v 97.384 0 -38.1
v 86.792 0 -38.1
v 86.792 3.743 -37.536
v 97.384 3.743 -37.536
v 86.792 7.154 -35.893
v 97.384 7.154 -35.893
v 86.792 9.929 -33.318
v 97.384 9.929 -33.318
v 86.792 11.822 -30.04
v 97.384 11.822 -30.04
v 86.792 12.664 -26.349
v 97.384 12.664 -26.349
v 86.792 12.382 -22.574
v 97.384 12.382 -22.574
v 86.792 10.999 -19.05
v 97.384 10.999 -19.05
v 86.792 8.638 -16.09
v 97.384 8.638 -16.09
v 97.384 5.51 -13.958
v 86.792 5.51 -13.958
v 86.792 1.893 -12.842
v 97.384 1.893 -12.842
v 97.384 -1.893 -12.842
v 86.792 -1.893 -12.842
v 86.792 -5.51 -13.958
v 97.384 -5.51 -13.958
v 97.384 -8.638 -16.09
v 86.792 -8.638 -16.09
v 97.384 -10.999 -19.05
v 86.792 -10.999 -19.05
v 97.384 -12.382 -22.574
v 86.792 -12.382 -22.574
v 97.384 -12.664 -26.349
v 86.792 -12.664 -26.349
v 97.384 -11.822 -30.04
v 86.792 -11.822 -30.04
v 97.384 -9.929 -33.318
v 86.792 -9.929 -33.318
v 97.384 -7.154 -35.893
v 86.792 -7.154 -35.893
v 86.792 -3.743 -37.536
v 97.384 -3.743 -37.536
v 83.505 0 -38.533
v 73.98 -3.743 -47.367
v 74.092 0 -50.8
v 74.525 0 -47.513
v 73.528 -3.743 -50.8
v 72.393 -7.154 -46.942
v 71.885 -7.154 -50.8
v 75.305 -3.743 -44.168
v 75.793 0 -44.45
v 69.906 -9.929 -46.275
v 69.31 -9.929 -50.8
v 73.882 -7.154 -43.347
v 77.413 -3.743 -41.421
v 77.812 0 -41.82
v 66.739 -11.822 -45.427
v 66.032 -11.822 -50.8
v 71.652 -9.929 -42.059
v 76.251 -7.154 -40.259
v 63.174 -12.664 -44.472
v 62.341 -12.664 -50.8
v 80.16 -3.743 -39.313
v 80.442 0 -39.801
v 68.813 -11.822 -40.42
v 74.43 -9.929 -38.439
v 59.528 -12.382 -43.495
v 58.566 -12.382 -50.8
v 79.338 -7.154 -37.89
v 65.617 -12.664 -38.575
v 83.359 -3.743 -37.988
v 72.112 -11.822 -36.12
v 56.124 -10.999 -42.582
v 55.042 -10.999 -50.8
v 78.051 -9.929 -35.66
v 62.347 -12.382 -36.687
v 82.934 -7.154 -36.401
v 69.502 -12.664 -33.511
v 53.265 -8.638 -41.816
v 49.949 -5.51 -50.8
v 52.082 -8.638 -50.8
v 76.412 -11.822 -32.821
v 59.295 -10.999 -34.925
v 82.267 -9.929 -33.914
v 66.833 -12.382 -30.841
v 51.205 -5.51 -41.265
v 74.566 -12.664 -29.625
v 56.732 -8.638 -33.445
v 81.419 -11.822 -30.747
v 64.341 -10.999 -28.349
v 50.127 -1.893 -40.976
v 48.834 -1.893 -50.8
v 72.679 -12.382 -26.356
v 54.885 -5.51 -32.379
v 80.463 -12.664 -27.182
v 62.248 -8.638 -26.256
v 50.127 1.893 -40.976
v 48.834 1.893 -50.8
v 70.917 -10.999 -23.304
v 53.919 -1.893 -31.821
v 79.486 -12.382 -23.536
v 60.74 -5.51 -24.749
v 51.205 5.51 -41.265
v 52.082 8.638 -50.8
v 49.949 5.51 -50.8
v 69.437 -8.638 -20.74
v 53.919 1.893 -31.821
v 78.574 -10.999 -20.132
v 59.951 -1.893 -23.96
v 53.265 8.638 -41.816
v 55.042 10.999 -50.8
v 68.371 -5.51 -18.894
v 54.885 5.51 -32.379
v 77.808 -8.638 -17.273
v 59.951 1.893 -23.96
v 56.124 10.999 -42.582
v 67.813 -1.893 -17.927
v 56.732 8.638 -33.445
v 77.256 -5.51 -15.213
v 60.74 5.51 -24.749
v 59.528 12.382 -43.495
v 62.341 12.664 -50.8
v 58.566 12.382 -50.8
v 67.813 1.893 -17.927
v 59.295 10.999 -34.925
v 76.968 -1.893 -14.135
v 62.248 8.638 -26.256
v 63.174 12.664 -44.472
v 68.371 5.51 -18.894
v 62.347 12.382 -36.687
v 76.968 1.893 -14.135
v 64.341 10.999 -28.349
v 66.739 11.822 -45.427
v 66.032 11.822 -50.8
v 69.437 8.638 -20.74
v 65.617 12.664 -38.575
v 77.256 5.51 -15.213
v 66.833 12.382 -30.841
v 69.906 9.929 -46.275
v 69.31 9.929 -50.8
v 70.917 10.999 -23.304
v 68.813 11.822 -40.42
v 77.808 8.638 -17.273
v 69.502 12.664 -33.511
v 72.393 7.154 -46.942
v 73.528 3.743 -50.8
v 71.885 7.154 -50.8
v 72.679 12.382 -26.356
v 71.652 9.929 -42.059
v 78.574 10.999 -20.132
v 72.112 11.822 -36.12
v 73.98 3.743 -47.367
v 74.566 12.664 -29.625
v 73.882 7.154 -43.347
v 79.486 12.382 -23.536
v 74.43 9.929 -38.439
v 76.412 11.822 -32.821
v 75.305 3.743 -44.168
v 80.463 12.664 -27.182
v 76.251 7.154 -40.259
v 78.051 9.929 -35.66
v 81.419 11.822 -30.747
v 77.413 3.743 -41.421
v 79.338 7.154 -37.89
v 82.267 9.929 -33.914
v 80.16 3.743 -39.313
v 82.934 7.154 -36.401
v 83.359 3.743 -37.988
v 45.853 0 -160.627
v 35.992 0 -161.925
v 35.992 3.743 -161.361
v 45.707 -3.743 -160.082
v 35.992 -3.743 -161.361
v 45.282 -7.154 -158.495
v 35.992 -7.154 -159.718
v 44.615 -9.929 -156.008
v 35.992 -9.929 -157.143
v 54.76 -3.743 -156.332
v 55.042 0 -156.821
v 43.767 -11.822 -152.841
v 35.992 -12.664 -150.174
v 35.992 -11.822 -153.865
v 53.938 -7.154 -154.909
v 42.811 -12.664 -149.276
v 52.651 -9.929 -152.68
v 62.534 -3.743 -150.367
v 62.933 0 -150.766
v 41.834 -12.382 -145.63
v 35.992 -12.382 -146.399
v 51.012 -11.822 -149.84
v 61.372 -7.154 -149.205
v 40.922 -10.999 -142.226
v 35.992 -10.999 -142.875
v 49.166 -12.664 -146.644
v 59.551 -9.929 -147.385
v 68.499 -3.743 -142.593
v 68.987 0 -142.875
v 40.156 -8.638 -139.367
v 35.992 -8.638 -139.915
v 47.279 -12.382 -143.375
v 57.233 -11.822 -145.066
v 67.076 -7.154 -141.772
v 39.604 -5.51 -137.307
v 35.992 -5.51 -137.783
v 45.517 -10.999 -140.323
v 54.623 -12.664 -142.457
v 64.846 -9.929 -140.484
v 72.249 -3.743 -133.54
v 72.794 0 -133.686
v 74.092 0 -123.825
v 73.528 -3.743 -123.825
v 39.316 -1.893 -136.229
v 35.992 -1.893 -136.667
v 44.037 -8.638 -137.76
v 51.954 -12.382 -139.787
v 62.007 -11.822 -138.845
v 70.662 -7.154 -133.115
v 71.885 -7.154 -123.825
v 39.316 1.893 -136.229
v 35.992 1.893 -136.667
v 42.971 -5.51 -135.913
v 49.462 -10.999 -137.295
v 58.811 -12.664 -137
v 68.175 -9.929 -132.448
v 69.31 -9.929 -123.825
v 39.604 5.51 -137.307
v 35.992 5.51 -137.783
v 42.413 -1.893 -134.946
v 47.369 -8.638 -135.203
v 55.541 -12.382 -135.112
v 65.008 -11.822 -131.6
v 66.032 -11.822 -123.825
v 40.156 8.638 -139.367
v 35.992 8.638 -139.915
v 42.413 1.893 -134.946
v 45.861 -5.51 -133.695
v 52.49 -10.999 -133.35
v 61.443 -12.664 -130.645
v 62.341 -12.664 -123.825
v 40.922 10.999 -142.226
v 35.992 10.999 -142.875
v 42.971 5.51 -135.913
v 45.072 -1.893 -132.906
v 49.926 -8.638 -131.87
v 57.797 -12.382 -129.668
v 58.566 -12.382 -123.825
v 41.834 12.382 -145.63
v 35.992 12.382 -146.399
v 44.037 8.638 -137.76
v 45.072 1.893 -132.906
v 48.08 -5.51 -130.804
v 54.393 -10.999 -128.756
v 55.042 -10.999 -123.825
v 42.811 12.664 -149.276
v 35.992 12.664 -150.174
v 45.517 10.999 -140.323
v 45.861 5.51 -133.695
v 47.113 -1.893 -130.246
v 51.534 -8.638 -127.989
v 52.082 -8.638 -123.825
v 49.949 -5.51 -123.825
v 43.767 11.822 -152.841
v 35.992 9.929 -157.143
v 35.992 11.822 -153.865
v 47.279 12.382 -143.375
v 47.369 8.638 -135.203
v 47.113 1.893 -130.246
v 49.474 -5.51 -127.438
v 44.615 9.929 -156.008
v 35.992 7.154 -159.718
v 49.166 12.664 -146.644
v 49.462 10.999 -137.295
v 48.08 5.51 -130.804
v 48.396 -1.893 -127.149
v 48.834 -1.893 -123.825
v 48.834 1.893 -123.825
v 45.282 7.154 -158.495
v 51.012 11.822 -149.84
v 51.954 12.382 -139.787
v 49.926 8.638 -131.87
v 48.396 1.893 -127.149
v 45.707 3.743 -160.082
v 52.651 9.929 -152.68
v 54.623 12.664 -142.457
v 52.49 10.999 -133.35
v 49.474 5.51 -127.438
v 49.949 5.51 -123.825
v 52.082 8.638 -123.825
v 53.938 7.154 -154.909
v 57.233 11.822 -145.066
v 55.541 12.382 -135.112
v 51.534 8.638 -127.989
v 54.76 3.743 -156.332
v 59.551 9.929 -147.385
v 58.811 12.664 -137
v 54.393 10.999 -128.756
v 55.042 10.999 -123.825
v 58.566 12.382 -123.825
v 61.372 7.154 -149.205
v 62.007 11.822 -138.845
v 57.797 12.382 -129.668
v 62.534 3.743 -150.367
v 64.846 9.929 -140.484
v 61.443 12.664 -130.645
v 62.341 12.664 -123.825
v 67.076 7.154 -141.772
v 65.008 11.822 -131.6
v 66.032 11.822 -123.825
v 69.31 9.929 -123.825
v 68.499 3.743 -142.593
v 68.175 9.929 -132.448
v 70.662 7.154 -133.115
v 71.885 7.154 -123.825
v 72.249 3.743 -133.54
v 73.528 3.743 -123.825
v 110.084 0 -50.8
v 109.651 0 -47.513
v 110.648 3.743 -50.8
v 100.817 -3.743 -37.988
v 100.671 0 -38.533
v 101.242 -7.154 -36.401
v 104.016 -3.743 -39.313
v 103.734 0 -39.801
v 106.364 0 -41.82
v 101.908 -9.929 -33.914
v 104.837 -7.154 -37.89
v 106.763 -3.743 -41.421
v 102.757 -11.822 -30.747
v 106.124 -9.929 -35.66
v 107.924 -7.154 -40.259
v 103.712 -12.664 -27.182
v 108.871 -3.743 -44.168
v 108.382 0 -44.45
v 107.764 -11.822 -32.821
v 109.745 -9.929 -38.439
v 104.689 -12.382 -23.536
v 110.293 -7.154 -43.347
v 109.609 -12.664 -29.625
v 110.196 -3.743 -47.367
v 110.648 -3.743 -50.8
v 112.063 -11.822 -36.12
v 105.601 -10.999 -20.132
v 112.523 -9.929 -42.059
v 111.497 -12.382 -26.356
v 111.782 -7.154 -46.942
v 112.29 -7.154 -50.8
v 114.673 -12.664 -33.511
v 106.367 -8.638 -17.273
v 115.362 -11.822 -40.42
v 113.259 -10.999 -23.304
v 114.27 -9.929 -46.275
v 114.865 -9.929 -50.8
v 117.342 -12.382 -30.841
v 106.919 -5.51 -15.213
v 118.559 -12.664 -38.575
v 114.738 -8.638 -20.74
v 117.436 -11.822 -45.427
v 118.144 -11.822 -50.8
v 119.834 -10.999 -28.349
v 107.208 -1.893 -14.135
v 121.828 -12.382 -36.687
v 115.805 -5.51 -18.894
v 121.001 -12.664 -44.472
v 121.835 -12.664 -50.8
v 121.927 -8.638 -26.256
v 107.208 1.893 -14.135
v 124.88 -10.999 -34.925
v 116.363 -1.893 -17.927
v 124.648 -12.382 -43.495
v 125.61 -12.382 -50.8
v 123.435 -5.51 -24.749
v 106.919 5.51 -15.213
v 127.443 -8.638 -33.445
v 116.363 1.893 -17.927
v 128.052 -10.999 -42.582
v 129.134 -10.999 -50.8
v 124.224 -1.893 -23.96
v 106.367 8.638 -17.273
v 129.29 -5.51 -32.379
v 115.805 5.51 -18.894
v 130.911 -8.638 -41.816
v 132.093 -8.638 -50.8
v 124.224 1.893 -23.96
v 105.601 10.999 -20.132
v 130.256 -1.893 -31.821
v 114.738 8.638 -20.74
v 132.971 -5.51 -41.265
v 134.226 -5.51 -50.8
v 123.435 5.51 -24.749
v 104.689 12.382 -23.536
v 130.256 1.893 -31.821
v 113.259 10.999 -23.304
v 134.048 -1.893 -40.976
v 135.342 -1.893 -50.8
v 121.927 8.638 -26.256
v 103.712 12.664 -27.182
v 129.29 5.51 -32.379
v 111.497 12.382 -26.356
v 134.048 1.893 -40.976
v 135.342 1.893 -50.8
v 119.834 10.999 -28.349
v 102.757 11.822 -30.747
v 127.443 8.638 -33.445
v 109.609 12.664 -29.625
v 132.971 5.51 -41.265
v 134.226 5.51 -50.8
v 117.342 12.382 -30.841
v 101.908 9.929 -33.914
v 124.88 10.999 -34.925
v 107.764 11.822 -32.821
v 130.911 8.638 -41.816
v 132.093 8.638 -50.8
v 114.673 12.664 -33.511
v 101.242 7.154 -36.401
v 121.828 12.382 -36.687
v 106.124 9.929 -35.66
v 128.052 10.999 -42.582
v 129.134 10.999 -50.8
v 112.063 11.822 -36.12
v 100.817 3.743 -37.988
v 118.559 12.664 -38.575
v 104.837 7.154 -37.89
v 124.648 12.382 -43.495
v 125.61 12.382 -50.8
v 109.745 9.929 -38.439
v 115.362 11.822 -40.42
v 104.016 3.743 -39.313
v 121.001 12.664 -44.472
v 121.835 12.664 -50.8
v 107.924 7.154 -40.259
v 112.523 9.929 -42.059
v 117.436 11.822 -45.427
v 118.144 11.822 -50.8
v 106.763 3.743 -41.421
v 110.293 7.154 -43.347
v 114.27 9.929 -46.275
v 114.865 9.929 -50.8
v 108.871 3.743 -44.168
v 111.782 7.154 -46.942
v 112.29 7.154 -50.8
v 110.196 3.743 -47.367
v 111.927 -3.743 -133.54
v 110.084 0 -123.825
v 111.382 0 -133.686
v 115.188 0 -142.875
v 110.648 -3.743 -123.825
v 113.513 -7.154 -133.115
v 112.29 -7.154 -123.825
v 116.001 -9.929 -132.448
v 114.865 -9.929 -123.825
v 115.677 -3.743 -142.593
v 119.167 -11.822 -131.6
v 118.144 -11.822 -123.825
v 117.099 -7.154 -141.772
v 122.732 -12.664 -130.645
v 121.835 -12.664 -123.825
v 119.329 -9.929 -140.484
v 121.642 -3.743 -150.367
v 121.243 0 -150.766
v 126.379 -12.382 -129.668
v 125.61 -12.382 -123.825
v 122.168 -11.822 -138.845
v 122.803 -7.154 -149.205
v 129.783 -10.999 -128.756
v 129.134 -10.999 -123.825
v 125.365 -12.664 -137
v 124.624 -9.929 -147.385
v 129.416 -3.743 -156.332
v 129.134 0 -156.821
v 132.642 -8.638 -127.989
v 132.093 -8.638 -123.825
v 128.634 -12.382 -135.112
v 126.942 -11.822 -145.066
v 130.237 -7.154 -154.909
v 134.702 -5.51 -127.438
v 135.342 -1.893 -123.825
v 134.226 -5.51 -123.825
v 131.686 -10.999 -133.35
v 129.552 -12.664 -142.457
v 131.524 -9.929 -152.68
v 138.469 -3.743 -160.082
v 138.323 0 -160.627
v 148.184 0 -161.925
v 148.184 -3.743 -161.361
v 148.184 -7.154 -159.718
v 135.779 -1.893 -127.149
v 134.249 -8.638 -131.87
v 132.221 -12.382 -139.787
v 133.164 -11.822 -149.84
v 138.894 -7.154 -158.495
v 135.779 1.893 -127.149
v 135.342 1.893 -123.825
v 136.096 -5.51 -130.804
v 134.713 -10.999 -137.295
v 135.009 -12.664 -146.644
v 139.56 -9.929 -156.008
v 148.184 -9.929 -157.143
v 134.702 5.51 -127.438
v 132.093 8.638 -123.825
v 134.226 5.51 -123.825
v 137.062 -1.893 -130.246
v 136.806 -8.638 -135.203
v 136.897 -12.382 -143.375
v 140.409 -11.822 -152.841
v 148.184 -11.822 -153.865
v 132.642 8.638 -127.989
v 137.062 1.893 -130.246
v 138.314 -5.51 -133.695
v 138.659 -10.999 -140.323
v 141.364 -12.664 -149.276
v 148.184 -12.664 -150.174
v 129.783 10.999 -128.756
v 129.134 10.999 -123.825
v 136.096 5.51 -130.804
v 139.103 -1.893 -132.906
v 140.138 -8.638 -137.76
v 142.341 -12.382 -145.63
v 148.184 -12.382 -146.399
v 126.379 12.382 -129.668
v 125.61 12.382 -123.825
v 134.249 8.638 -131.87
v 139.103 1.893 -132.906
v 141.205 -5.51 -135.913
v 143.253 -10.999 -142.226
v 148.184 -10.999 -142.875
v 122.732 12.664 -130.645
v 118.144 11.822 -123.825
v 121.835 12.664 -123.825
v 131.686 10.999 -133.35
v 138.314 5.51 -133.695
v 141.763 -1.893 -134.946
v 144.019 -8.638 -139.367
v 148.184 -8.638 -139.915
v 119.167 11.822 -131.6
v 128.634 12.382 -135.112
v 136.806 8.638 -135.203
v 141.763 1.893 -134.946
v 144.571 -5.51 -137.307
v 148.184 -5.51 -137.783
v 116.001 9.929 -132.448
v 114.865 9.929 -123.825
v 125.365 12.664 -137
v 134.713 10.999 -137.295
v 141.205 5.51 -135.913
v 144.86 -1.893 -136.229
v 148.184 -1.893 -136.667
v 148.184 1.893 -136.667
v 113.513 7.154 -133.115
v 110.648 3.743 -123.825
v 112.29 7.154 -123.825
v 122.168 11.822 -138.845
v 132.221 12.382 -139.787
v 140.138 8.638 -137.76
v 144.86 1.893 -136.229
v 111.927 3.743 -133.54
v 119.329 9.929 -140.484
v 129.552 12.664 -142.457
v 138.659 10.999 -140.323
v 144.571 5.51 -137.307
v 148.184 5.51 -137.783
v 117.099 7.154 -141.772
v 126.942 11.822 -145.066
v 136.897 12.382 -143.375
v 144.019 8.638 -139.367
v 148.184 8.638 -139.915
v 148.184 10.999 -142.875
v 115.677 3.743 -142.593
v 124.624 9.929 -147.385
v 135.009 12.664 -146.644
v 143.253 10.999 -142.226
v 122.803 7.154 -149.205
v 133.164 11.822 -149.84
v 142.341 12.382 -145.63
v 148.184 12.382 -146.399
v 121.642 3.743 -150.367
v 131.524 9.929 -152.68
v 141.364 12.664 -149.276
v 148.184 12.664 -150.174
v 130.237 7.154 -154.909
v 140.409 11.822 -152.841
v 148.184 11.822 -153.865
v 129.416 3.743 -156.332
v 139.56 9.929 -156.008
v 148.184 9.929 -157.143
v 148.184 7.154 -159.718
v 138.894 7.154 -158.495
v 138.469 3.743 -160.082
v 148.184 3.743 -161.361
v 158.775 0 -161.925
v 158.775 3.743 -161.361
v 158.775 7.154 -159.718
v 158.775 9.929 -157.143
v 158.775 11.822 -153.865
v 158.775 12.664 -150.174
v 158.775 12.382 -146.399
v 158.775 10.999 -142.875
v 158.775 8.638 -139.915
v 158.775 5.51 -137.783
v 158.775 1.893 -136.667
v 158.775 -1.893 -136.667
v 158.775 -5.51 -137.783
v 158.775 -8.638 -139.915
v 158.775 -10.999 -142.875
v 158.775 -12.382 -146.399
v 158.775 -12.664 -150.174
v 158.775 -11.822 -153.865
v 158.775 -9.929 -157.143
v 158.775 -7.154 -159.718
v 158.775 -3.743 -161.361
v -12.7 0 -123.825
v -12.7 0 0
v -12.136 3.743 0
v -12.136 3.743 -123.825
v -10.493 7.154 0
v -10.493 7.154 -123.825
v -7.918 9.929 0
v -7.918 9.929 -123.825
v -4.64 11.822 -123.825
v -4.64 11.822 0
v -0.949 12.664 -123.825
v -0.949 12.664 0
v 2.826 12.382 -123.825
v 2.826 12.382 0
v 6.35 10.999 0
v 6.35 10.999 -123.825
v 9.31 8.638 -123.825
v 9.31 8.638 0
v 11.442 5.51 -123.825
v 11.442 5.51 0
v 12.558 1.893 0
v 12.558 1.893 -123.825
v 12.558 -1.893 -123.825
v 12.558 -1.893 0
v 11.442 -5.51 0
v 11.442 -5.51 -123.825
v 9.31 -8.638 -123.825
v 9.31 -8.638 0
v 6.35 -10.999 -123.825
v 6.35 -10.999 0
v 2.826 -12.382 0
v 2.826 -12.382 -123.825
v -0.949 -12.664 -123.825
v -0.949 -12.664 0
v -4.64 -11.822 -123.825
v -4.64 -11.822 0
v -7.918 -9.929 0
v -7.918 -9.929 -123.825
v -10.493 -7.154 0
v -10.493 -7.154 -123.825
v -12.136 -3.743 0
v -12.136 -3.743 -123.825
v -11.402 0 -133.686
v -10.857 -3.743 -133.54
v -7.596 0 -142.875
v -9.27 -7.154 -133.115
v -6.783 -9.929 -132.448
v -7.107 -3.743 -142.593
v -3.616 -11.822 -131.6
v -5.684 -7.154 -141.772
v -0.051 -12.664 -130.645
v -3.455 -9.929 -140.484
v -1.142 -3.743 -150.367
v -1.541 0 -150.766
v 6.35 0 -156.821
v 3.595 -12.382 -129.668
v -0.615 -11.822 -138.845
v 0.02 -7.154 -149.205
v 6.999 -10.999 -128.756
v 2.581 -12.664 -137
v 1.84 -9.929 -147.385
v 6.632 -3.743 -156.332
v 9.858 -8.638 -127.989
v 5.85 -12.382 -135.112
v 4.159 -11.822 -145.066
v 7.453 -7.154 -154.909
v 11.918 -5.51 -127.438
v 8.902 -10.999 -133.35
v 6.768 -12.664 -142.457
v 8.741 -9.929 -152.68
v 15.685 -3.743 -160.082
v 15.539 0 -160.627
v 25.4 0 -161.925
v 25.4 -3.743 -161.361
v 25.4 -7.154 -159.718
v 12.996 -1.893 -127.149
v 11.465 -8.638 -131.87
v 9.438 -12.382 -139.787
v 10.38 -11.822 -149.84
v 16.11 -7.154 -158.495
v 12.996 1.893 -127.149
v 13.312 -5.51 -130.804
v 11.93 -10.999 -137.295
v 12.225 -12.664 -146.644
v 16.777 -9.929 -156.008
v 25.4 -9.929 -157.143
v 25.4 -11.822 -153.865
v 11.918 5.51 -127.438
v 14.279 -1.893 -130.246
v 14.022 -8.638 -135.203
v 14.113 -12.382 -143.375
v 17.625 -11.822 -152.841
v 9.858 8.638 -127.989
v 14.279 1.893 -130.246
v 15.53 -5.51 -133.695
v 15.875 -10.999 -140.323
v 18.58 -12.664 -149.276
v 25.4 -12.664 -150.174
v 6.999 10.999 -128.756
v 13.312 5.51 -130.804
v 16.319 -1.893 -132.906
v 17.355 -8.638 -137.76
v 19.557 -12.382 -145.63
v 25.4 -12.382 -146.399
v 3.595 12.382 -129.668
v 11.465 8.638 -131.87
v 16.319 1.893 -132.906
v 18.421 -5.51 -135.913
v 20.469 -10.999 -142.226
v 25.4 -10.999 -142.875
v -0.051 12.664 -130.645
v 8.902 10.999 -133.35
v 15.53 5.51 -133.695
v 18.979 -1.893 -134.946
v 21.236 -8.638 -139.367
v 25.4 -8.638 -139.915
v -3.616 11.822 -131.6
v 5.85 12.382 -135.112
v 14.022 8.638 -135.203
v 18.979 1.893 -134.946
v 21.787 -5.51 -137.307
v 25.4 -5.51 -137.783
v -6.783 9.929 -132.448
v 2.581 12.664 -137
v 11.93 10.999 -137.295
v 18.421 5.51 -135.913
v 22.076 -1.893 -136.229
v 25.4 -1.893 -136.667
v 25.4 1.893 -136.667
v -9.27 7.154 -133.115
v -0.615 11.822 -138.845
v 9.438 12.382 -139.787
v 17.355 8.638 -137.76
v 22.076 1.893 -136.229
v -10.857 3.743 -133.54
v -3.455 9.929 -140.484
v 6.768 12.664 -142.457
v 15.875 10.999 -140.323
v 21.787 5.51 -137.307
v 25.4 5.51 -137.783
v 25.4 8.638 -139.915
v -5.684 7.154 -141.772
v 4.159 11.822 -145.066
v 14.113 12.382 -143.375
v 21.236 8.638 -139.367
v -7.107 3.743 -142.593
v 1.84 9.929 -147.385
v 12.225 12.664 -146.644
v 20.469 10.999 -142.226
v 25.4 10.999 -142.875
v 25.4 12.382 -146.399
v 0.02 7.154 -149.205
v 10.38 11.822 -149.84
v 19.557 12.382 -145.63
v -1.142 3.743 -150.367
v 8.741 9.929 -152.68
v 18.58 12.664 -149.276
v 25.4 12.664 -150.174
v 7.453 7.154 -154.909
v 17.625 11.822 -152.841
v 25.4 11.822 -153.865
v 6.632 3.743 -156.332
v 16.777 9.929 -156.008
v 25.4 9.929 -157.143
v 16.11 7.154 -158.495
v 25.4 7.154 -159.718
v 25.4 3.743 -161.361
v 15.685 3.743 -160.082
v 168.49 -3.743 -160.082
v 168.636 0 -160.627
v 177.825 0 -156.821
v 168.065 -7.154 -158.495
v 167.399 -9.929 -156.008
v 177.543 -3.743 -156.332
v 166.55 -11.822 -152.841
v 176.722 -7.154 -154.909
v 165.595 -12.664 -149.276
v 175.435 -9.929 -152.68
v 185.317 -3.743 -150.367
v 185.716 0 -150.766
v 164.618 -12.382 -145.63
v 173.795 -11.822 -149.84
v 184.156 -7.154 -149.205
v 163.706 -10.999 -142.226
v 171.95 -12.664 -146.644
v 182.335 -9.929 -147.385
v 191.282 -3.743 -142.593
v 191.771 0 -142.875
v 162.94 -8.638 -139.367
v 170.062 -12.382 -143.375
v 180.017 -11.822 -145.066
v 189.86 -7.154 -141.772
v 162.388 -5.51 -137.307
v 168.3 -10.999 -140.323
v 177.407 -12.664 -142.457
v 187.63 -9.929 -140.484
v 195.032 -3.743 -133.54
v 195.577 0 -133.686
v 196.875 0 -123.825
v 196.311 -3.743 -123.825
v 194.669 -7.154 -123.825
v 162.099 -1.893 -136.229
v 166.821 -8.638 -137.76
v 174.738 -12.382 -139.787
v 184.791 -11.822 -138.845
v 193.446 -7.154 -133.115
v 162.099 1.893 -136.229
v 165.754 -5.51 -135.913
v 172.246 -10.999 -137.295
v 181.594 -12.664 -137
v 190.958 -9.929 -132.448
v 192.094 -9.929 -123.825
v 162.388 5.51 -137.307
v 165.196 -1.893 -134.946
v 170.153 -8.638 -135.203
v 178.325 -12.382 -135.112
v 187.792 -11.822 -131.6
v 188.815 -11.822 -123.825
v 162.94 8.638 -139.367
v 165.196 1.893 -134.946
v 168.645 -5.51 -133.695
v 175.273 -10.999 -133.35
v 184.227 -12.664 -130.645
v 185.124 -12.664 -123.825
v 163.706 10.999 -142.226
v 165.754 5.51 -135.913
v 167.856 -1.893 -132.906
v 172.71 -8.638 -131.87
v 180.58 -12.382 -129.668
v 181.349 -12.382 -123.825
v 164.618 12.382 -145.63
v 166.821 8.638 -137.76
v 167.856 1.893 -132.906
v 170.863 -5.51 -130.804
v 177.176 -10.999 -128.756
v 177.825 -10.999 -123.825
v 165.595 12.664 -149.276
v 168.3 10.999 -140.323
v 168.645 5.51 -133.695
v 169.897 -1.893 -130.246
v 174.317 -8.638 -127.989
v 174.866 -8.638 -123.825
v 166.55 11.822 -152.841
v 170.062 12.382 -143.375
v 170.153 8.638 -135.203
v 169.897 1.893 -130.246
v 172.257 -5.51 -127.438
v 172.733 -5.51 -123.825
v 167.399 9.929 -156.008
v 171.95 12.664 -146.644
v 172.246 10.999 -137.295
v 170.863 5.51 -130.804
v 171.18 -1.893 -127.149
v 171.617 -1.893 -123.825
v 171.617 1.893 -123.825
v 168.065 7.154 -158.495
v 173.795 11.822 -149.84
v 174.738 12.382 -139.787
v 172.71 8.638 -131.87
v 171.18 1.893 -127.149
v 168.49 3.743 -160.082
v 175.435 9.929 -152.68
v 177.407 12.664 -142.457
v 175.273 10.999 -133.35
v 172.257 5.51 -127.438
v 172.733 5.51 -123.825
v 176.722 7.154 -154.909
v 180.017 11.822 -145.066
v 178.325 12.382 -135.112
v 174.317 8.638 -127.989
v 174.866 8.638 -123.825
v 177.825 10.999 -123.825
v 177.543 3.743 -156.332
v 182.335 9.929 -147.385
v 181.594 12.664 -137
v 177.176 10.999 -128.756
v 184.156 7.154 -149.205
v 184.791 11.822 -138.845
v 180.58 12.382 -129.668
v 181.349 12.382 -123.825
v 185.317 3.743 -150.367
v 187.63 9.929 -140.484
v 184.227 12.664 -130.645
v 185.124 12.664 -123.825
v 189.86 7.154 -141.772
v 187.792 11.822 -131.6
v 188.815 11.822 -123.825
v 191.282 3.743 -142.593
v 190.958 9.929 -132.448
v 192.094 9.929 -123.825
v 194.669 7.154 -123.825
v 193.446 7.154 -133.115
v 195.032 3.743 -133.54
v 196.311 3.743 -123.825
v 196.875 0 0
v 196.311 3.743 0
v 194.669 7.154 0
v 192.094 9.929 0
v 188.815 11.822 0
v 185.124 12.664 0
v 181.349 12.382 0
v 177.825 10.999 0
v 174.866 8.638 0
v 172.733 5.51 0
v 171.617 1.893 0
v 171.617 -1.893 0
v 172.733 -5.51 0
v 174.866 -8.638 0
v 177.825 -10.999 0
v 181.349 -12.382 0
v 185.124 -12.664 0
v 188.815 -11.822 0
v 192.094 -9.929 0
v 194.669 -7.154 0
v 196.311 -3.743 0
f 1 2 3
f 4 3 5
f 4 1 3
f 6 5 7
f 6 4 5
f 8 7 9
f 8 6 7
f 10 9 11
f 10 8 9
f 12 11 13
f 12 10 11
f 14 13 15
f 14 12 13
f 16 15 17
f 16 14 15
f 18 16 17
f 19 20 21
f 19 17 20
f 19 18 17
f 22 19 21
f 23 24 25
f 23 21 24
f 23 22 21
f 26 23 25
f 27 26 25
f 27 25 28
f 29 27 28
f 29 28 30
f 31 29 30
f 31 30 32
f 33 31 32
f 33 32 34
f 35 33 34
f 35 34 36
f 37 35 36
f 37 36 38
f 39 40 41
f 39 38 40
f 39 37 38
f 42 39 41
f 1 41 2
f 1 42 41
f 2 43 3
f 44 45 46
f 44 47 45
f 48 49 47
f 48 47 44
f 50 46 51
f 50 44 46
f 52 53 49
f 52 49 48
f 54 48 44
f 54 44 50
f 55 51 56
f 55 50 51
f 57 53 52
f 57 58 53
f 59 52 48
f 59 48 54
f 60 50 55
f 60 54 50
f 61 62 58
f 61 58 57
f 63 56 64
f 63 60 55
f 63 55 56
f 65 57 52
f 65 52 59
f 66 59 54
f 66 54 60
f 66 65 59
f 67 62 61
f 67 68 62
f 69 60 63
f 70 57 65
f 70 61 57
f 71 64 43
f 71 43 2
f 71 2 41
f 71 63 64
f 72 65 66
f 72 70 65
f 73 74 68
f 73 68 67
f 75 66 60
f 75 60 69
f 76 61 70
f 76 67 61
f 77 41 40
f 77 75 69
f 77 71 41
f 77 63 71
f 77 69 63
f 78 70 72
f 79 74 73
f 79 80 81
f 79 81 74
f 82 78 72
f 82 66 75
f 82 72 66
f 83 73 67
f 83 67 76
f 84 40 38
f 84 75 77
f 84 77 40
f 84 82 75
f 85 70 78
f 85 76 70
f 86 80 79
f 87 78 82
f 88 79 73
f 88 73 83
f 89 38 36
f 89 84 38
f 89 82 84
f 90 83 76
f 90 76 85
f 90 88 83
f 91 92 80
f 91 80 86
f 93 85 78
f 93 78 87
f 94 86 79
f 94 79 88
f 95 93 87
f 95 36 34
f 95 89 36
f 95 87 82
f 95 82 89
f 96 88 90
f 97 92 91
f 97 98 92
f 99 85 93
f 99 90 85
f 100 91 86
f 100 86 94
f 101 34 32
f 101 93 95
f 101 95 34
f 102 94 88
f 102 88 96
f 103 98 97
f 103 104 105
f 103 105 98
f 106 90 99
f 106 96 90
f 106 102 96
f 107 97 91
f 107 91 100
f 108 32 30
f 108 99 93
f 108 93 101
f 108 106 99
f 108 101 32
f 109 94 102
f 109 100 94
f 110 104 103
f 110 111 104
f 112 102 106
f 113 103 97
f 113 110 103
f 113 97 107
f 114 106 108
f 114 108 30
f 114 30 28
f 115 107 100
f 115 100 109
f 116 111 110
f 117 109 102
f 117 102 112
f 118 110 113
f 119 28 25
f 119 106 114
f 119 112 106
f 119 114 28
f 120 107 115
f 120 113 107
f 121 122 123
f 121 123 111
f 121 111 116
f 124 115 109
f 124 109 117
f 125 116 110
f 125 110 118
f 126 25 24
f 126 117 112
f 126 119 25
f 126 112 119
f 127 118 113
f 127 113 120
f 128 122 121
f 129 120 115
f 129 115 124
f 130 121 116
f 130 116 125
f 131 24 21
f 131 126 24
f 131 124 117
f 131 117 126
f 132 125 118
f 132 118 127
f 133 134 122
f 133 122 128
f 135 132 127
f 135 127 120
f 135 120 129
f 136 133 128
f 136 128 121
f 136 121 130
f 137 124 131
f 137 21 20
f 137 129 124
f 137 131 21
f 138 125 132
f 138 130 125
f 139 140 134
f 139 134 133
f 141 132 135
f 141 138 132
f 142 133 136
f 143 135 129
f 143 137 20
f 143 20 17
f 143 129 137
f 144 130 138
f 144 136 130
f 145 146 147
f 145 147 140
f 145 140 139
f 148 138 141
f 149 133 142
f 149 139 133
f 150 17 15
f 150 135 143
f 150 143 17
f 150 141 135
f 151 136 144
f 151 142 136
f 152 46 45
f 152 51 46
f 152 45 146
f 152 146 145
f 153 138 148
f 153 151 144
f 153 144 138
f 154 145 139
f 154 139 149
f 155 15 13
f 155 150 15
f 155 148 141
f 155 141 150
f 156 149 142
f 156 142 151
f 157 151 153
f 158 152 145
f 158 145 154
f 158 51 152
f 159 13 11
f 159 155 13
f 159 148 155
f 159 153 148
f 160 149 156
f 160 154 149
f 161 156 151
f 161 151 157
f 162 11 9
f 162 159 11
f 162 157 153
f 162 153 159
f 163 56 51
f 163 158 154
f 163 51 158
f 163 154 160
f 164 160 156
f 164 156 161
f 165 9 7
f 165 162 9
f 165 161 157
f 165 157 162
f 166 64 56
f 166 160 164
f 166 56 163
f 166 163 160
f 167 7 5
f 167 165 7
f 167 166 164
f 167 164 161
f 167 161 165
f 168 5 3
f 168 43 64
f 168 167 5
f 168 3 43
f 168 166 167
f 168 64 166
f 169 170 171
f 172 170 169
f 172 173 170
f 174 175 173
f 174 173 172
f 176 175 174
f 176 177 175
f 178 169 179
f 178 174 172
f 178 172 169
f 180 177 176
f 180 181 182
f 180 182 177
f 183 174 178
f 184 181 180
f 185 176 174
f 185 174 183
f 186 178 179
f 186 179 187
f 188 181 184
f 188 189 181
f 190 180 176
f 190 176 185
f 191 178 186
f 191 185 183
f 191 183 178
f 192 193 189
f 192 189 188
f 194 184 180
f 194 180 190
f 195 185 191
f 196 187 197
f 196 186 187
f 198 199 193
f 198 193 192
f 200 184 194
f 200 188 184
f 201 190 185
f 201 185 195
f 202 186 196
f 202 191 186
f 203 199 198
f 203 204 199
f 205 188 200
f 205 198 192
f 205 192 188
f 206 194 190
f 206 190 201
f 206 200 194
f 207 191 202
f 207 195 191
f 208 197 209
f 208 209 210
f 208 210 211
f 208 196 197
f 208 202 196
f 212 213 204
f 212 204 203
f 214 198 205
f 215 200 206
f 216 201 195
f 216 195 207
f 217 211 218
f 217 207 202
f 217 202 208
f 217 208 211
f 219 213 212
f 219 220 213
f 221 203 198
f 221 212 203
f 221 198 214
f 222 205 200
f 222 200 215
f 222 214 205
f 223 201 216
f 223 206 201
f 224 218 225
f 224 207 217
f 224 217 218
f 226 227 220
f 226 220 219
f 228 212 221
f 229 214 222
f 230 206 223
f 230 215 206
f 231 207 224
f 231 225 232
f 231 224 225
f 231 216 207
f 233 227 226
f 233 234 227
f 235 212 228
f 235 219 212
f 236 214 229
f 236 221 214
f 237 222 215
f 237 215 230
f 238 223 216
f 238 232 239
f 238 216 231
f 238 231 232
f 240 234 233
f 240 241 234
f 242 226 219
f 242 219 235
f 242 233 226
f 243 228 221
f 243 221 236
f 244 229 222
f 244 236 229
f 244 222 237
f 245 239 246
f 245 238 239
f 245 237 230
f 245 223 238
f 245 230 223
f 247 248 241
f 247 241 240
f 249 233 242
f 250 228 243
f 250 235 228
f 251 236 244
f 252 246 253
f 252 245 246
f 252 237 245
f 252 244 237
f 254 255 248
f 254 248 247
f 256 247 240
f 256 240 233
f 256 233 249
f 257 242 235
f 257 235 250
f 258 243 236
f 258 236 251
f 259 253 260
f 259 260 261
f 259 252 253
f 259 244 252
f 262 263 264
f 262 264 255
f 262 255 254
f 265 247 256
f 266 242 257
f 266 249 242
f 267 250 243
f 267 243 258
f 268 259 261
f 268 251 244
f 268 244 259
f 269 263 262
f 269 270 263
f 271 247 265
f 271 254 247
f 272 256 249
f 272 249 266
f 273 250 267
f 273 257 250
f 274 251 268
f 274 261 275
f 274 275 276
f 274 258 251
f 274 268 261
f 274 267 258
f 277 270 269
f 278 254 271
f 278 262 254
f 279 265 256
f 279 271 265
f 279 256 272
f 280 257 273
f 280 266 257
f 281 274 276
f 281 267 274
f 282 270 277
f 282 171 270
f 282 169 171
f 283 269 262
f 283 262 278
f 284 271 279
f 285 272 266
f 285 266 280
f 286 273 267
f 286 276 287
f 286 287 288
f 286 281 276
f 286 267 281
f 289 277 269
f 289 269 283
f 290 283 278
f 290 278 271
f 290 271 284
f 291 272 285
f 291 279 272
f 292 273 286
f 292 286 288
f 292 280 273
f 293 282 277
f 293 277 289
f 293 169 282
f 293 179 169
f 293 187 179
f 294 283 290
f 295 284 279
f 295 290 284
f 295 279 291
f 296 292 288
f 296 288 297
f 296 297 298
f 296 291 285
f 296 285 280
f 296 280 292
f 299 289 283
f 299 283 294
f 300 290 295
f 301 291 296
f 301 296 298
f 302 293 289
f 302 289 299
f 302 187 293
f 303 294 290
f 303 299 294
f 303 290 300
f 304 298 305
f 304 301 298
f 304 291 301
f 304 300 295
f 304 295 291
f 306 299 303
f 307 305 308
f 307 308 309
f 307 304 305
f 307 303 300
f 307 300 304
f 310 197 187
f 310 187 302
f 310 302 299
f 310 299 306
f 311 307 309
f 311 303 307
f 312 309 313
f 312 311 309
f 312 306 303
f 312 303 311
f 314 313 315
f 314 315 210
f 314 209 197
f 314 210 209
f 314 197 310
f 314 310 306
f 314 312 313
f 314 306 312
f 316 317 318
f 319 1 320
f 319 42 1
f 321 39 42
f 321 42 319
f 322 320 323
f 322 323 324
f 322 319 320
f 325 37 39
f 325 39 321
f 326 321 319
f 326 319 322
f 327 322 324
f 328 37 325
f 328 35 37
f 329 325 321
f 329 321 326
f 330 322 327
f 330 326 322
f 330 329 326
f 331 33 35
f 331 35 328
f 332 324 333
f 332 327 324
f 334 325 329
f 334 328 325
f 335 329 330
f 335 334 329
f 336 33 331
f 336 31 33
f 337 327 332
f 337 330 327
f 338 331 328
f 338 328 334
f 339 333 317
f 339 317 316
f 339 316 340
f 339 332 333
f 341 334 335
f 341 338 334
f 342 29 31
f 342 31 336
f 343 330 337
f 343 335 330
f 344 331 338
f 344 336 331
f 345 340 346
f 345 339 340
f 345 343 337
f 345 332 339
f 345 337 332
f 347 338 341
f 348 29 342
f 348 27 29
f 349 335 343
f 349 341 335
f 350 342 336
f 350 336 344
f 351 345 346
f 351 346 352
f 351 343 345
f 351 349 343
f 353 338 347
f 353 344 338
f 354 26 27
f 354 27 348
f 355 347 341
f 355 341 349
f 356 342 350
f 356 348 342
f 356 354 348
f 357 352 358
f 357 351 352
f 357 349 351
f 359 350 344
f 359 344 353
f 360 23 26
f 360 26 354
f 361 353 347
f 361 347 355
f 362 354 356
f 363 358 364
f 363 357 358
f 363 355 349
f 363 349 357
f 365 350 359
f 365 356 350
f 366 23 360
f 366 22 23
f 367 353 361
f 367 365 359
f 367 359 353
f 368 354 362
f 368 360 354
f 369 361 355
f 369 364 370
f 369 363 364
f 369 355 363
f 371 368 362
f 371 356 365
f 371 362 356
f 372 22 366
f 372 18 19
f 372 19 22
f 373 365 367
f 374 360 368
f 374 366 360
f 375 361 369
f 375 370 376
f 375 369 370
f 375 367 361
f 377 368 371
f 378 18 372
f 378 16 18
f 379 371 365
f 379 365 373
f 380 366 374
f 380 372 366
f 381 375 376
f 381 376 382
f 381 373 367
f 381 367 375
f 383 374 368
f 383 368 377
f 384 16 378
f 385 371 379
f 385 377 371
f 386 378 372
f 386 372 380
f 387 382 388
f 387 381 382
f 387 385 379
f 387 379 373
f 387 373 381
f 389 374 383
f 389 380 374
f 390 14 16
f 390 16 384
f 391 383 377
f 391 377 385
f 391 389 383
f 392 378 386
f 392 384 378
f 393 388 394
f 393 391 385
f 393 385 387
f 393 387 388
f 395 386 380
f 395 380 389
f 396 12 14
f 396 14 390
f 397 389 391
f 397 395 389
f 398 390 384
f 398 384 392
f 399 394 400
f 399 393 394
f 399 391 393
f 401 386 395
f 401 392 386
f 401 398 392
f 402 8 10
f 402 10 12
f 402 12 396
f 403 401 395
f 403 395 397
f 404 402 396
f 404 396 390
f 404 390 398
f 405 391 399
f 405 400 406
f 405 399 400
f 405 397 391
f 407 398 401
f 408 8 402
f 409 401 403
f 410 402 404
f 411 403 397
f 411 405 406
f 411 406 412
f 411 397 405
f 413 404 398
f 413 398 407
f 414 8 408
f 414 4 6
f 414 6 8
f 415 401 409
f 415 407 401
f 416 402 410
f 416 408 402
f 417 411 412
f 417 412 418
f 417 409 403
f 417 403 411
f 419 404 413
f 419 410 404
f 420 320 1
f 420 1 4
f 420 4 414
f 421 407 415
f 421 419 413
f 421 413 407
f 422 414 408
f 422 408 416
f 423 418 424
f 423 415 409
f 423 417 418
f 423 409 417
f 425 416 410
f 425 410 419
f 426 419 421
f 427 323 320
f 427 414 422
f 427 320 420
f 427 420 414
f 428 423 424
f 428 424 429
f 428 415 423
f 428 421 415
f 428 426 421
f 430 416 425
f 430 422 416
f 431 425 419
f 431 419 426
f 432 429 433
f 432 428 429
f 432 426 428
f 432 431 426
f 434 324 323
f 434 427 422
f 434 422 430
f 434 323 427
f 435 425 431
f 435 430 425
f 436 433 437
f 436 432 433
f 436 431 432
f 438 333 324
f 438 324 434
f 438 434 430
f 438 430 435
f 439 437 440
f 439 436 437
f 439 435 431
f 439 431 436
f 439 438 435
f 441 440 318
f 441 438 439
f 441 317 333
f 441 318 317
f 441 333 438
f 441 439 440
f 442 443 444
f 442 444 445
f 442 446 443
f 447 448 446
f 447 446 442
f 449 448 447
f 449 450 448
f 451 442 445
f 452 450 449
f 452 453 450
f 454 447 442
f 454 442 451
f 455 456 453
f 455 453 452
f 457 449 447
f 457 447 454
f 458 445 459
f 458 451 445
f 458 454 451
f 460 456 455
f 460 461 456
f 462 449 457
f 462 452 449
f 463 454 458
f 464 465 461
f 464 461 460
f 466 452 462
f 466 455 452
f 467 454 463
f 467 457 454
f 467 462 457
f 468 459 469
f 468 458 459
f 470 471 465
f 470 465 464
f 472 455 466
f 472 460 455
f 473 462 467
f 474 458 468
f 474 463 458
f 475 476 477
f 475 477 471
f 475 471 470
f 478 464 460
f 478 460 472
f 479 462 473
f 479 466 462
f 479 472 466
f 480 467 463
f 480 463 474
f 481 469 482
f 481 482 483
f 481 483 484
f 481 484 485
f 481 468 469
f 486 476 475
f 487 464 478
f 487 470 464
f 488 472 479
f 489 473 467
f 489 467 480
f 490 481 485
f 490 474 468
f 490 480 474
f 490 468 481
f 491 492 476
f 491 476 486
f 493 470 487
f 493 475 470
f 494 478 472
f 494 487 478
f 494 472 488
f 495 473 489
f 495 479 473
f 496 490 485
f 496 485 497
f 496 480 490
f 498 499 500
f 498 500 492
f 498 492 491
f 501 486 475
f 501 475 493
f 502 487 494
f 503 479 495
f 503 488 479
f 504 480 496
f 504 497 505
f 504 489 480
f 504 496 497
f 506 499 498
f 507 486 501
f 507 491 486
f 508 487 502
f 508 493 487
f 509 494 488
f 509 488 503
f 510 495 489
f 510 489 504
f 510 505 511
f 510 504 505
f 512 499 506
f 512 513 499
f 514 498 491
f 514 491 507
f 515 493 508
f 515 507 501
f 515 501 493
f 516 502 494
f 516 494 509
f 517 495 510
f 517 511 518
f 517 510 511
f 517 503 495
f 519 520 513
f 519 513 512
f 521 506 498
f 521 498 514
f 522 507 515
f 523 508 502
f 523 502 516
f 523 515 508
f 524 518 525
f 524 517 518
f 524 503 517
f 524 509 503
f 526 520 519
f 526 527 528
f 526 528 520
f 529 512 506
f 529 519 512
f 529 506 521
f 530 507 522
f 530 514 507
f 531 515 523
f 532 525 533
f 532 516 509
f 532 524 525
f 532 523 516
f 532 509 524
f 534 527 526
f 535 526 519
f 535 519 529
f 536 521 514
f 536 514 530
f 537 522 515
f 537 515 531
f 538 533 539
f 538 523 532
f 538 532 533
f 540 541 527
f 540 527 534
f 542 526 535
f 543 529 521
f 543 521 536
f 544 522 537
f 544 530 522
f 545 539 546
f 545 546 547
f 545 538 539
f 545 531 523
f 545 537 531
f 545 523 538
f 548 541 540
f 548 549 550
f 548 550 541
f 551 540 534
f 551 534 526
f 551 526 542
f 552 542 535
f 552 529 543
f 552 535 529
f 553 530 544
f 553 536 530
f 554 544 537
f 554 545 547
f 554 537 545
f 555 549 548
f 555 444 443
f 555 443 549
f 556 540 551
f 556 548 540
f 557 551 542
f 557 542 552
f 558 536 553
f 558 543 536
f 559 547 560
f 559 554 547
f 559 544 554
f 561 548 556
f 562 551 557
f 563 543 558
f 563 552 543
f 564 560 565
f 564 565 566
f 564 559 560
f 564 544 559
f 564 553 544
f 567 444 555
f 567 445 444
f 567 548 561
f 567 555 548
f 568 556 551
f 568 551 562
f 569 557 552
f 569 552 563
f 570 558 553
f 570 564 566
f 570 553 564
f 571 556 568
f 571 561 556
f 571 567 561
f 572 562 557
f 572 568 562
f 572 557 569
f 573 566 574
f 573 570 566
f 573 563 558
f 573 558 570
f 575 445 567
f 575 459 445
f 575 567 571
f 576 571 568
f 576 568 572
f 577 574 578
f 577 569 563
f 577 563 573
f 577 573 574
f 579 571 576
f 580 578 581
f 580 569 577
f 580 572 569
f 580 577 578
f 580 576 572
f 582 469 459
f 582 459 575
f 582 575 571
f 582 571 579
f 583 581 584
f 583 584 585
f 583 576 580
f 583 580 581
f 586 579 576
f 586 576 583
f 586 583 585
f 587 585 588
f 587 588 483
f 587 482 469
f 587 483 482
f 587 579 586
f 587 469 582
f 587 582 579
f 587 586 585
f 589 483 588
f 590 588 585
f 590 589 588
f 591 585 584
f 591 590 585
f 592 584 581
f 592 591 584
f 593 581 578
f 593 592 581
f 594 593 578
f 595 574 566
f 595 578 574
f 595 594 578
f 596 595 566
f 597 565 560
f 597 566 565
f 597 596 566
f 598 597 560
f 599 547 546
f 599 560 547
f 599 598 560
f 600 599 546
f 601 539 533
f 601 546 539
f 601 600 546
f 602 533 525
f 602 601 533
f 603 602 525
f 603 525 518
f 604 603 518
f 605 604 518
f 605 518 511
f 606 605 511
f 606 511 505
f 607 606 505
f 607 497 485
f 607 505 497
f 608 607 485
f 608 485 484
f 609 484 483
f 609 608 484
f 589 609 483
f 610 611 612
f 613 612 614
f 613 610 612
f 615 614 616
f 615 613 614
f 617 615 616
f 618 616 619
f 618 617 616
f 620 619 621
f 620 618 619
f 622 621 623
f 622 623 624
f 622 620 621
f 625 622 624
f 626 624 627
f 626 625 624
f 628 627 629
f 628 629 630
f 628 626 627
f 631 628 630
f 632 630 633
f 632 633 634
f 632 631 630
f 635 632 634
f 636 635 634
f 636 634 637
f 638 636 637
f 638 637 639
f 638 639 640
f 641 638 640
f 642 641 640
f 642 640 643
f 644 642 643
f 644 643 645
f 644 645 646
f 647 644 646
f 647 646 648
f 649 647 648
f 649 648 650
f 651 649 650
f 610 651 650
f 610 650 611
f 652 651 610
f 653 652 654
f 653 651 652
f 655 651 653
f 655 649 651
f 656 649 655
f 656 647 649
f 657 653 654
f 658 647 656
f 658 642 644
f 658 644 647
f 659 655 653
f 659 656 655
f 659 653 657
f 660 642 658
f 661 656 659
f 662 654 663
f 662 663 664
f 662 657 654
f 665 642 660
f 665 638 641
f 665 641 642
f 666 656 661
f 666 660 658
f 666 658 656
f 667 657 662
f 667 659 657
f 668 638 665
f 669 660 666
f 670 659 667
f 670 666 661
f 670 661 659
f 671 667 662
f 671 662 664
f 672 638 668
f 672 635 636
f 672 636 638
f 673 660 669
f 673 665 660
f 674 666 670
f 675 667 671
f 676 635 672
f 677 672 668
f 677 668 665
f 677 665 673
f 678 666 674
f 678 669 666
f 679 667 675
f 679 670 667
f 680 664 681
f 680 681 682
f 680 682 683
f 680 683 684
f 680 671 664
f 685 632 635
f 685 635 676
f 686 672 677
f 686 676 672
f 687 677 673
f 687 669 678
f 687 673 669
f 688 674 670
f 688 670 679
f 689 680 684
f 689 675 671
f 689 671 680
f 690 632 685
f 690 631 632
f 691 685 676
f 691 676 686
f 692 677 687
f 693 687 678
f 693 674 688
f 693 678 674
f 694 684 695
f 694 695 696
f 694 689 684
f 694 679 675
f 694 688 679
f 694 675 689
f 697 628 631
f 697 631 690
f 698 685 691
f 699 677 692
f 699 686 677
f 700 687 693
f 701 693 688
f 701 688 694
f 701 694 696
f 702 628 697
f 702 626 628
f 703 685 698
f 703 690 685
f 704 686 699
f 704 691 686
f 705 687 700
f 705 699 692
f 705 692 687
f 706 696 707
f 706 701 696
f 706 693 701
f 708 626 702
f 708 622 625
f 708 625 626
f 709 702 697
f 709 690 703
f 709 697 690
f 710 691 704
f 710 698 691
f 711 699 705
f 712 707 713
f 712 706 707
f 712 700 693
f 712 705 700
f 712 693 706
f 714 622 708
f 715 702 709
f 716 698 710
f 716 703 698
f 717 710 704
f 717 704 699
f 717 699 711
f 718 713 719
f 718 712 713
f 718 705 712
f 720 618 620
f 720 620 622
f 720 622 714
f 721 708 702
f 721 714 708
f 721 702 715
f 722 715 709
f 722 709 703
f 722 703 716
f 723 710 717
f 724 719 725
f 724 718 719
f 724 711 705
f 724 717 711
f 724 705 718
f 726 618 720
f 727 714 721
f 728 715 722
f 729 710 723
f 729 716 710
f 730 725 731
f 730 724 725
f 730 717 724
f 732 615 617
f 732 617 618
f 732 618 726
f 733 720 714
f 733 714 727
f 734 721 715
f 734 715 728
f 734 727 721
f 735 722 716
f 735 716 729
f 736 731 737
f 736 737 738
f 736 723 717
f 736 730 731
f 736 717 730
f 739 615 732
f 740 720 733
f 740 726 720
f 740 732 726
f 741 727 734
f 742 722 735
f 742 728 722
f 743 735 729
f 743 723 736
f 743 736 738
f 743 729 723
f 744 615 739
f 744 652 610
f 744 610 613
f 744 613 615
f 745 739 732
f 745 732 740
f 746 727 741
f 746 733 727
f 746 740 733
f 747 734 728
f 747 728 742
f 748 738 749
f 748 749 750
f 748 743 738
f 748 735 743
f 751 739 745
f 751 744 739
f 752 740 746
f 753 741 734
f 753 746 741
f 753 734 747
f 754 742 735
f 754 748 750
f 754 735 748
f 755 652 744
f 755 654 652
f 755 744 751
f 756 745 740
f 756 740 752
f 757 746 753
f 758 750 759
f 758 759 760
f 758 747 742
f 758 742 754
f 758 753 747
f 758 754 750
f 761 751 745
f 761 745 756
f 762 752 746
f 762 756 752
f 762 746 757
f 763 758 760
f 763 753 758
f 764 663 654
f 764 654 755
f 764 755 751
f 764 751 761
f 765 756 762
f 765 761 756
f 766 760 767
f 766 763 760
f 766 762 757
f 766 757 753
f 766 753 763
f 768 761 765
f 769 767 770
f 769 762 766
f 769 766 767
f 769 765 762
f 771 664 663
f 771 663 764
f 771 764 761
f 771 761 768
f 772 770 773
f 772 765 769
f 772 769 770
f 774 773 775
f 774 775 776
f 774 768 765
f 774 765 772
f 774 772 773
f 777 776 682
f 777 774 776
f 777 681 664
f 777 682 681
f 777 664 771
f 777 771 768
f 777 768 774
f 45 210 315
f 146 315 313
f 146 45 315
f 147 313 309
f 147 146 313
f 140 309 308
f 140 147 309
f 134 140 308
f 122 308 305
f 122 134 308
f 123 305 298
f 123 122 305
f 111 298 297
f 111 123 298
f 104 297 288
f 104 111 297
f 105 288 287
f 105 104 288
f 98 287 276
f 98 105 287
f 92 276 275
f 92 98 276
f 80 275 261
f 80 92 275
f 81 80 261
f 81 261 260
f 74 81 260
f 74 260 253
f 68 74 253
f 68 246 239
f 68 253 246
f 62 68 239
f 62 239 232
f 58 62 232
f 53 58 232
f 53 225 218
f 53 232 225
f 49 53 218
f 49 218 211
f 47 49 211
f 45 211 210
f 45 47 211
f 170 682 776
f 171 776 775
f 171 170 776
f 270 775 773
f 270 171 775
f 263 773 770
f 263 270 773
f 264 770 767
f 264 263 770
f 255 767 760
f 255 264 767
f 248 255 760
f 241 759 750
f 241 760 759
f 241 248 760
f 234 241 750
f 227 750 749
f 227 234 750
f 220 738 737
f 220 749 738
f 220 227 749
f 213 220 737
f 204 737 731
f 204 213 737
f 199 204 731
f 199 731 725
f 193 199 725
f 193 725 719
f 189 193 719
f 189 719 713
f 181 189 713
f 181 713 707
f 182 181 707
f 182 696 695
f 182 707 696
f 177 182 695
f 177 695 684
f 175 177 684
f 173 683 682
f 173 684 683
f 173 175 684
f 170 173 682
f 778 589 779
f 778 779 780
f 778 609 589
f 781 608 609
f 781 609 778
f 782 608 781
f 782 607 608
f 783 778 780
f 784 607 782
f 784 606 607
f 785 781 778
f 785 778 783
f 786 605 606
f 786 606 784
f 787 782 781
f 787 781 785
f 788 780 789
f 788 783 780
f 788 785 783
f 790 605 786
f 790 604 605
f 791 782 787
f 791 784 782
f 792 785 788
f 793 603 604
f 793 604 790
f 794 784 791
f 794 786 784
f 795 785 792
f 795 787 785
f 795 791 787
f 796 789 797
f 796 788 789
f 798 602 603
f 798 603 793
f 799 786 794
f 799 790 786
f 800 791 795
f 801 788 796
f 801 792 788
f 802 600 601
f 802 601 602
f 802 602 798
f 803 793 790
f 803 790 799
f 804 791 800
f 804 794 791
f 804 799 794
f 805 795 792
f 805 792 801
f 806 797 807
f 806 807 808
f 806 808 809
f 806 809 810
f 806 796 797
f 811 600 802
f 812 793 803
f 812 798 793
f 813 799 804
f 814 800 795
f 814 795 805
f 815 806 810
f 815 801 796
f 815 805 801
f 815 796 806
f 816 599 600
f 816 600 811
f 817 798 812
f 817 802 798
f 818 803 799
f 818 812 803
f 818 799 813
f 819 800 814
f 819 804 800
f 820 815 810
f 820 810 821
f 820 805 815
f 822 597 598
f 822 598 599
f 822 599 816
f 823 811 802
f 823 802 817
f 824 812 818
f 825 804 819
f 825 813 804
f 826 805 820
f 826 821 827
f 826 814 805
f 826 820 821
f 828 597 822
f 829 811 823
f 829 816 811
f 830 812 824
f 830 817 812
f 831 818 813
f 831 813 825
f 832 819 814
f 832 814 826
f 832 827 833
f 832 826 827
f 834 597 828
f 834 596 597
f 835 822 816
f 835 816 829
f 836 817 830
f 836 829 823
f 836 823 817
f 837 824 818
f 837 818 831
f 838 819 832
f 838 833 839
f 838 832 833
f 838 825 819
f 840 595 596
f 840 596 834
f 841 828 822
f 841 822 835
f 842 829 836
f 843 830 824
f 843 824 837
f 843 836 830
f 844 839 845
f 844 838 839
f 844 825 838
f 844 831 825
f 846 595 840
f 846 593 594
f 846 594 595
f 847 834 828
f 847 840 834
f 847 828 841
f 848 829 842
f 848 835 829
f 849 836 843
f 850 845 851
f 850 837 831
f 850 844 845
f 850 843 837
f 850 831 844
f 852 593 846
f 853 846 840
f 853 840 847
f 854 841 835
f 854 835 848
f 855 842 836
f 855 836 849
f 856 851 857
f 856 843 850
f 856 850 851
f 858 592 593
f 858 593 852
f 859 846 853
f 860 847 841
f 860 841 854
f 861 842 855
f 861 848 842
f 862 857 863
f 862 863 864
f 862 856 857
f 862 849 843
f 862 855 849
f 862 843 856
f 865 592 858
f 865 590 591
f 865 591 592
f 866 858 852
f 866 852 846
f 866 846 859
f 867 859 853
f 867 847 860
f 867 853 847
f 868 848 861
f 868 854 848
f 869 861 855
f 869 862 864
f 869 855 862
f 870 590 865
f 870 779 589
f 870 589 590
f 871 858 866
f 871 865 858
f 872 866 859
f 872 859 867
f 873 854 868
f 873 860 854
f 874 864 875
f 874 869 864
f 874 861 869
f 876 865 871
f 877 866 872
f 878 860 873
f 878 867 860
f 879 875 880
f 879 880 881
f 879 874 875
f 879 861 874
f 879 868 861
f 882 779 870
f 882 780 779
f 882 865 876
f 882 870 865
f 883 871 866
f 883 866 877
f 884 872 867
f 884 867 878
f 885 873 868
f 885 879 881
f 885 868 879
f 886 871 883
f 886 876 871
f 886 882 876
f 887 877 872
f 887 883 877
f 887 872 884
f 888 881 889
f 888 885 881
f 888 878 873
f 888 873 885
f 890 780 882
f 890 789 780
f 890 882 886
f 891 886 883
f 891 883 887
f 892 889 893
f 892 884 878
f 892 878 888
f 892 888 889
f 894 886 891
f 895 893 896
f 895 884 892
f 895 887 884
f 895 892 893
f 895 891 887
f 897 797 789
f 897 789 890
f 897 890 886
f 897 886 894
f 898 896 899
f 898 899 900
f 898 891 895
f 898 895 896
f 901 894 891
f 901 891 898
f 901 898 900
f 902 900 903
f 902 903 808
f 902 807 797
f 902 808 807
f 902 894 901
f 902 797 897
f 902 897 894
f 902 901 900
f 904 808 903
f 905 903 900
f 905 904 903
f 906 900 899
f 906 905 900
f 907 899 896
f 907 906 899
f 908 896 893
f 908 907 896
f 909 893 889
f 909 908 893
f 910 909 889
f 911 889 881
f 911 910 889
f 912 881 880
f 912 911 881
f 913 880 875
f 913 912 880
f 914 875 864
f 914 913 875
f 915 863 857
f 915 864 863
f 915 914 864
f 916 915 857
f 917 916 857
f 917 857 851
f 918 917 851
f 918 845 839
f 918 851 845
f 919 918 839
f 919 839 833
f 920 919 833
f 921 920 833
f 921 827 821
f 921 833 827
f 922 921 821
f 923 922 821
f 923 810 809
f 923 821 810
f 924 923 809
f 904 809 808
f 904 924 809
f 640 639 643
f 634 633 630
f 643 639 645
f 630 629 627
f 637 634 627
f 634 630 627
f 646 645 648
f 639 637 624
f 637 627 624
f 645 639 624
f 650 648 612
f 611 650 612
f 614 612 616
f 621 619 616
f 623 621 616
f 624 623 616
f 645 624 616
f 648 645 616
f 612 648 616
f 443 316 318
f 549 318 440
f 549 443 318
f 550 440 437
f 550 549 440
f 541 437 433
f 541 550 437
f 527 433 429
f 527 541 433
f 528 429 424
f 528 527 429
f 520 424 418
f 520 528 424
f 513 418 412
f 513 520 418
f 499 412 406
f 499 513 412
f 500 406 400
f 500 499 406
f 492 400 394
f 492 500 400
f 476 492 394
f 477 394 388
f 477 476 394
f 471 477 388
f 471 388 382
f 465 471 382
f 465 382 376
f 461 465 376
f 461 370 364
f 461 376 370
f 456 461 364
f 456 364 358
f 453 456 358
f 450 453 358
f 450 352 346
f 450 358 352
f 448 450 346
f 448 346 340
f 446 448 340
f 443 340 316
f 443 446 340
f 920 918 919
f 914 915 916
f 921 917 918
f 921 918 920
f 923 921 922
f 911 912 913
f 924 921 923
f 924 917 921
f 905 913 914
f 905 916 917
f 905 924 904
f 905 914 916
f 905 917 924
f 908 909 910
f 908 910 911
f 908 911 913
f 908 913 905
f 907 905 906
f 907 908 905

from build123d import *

# Parameters (mm, degrees)
SWEEP1_PROFILE_R = 12.7


with BuildPart() as part:
    # Sweep1: sweep along a path in Sketch1
    with BuildLine(Plane(origin=(0, 0, 0), x_dir=(1, 0, 0), z_dir=(0, 1, 0))) as sweep1_path:
        Line((0, 0), (0, 123.825))
        ThreePointArc((0, 123.825), (7.439487758, 141.785512242), (25.4, 149.225))
        Line((25.4, 149.225), (35.9918, 149.225))
        ThreePointArc((35.9918, 149.225), (53.952312242, 141.785512242), (61.3918, 123.825))
        Line((61.3918, 123.825), (61.3918, 50.8))
        ThreePointArc((61.3918, 50.8), (68.831287758, 32.839487758), (86.7918, 25.4))
        Line((86.7918, 25.4), (97.3836, 25.4))
        ThreePointArc((97.3836, 25.4), (115.344112242, 32.839487758), (122.7836, 50.8))
        Line((122.7836, 50.8), (122.7836, 123.825))
        ThreePointArc((122.7836, 123.825), (130.223087758, 141.785512242), (148.1836, 149.225))
        Line((148.1836, 149.225), (158.7754, 149.225))
        ThreePointArc((158.7754, 149.225), (176.735912242, 141.785512242), (184.1754, 123.825))
        Line((184.1754, 123.825), (184.1754, 0))
    # Sweep1 profile (on start of the path) → Sweep1 (sweep)
    with BuildSketch(Plane(origin=(0, 0, 0), x_dir=(-1, 0, 0), z_dir=(0, 0, -1))):
        Circle(SWEEP1_PROFILE_R)
    sweep(path=sweep1_path.line)


solid = part.part
